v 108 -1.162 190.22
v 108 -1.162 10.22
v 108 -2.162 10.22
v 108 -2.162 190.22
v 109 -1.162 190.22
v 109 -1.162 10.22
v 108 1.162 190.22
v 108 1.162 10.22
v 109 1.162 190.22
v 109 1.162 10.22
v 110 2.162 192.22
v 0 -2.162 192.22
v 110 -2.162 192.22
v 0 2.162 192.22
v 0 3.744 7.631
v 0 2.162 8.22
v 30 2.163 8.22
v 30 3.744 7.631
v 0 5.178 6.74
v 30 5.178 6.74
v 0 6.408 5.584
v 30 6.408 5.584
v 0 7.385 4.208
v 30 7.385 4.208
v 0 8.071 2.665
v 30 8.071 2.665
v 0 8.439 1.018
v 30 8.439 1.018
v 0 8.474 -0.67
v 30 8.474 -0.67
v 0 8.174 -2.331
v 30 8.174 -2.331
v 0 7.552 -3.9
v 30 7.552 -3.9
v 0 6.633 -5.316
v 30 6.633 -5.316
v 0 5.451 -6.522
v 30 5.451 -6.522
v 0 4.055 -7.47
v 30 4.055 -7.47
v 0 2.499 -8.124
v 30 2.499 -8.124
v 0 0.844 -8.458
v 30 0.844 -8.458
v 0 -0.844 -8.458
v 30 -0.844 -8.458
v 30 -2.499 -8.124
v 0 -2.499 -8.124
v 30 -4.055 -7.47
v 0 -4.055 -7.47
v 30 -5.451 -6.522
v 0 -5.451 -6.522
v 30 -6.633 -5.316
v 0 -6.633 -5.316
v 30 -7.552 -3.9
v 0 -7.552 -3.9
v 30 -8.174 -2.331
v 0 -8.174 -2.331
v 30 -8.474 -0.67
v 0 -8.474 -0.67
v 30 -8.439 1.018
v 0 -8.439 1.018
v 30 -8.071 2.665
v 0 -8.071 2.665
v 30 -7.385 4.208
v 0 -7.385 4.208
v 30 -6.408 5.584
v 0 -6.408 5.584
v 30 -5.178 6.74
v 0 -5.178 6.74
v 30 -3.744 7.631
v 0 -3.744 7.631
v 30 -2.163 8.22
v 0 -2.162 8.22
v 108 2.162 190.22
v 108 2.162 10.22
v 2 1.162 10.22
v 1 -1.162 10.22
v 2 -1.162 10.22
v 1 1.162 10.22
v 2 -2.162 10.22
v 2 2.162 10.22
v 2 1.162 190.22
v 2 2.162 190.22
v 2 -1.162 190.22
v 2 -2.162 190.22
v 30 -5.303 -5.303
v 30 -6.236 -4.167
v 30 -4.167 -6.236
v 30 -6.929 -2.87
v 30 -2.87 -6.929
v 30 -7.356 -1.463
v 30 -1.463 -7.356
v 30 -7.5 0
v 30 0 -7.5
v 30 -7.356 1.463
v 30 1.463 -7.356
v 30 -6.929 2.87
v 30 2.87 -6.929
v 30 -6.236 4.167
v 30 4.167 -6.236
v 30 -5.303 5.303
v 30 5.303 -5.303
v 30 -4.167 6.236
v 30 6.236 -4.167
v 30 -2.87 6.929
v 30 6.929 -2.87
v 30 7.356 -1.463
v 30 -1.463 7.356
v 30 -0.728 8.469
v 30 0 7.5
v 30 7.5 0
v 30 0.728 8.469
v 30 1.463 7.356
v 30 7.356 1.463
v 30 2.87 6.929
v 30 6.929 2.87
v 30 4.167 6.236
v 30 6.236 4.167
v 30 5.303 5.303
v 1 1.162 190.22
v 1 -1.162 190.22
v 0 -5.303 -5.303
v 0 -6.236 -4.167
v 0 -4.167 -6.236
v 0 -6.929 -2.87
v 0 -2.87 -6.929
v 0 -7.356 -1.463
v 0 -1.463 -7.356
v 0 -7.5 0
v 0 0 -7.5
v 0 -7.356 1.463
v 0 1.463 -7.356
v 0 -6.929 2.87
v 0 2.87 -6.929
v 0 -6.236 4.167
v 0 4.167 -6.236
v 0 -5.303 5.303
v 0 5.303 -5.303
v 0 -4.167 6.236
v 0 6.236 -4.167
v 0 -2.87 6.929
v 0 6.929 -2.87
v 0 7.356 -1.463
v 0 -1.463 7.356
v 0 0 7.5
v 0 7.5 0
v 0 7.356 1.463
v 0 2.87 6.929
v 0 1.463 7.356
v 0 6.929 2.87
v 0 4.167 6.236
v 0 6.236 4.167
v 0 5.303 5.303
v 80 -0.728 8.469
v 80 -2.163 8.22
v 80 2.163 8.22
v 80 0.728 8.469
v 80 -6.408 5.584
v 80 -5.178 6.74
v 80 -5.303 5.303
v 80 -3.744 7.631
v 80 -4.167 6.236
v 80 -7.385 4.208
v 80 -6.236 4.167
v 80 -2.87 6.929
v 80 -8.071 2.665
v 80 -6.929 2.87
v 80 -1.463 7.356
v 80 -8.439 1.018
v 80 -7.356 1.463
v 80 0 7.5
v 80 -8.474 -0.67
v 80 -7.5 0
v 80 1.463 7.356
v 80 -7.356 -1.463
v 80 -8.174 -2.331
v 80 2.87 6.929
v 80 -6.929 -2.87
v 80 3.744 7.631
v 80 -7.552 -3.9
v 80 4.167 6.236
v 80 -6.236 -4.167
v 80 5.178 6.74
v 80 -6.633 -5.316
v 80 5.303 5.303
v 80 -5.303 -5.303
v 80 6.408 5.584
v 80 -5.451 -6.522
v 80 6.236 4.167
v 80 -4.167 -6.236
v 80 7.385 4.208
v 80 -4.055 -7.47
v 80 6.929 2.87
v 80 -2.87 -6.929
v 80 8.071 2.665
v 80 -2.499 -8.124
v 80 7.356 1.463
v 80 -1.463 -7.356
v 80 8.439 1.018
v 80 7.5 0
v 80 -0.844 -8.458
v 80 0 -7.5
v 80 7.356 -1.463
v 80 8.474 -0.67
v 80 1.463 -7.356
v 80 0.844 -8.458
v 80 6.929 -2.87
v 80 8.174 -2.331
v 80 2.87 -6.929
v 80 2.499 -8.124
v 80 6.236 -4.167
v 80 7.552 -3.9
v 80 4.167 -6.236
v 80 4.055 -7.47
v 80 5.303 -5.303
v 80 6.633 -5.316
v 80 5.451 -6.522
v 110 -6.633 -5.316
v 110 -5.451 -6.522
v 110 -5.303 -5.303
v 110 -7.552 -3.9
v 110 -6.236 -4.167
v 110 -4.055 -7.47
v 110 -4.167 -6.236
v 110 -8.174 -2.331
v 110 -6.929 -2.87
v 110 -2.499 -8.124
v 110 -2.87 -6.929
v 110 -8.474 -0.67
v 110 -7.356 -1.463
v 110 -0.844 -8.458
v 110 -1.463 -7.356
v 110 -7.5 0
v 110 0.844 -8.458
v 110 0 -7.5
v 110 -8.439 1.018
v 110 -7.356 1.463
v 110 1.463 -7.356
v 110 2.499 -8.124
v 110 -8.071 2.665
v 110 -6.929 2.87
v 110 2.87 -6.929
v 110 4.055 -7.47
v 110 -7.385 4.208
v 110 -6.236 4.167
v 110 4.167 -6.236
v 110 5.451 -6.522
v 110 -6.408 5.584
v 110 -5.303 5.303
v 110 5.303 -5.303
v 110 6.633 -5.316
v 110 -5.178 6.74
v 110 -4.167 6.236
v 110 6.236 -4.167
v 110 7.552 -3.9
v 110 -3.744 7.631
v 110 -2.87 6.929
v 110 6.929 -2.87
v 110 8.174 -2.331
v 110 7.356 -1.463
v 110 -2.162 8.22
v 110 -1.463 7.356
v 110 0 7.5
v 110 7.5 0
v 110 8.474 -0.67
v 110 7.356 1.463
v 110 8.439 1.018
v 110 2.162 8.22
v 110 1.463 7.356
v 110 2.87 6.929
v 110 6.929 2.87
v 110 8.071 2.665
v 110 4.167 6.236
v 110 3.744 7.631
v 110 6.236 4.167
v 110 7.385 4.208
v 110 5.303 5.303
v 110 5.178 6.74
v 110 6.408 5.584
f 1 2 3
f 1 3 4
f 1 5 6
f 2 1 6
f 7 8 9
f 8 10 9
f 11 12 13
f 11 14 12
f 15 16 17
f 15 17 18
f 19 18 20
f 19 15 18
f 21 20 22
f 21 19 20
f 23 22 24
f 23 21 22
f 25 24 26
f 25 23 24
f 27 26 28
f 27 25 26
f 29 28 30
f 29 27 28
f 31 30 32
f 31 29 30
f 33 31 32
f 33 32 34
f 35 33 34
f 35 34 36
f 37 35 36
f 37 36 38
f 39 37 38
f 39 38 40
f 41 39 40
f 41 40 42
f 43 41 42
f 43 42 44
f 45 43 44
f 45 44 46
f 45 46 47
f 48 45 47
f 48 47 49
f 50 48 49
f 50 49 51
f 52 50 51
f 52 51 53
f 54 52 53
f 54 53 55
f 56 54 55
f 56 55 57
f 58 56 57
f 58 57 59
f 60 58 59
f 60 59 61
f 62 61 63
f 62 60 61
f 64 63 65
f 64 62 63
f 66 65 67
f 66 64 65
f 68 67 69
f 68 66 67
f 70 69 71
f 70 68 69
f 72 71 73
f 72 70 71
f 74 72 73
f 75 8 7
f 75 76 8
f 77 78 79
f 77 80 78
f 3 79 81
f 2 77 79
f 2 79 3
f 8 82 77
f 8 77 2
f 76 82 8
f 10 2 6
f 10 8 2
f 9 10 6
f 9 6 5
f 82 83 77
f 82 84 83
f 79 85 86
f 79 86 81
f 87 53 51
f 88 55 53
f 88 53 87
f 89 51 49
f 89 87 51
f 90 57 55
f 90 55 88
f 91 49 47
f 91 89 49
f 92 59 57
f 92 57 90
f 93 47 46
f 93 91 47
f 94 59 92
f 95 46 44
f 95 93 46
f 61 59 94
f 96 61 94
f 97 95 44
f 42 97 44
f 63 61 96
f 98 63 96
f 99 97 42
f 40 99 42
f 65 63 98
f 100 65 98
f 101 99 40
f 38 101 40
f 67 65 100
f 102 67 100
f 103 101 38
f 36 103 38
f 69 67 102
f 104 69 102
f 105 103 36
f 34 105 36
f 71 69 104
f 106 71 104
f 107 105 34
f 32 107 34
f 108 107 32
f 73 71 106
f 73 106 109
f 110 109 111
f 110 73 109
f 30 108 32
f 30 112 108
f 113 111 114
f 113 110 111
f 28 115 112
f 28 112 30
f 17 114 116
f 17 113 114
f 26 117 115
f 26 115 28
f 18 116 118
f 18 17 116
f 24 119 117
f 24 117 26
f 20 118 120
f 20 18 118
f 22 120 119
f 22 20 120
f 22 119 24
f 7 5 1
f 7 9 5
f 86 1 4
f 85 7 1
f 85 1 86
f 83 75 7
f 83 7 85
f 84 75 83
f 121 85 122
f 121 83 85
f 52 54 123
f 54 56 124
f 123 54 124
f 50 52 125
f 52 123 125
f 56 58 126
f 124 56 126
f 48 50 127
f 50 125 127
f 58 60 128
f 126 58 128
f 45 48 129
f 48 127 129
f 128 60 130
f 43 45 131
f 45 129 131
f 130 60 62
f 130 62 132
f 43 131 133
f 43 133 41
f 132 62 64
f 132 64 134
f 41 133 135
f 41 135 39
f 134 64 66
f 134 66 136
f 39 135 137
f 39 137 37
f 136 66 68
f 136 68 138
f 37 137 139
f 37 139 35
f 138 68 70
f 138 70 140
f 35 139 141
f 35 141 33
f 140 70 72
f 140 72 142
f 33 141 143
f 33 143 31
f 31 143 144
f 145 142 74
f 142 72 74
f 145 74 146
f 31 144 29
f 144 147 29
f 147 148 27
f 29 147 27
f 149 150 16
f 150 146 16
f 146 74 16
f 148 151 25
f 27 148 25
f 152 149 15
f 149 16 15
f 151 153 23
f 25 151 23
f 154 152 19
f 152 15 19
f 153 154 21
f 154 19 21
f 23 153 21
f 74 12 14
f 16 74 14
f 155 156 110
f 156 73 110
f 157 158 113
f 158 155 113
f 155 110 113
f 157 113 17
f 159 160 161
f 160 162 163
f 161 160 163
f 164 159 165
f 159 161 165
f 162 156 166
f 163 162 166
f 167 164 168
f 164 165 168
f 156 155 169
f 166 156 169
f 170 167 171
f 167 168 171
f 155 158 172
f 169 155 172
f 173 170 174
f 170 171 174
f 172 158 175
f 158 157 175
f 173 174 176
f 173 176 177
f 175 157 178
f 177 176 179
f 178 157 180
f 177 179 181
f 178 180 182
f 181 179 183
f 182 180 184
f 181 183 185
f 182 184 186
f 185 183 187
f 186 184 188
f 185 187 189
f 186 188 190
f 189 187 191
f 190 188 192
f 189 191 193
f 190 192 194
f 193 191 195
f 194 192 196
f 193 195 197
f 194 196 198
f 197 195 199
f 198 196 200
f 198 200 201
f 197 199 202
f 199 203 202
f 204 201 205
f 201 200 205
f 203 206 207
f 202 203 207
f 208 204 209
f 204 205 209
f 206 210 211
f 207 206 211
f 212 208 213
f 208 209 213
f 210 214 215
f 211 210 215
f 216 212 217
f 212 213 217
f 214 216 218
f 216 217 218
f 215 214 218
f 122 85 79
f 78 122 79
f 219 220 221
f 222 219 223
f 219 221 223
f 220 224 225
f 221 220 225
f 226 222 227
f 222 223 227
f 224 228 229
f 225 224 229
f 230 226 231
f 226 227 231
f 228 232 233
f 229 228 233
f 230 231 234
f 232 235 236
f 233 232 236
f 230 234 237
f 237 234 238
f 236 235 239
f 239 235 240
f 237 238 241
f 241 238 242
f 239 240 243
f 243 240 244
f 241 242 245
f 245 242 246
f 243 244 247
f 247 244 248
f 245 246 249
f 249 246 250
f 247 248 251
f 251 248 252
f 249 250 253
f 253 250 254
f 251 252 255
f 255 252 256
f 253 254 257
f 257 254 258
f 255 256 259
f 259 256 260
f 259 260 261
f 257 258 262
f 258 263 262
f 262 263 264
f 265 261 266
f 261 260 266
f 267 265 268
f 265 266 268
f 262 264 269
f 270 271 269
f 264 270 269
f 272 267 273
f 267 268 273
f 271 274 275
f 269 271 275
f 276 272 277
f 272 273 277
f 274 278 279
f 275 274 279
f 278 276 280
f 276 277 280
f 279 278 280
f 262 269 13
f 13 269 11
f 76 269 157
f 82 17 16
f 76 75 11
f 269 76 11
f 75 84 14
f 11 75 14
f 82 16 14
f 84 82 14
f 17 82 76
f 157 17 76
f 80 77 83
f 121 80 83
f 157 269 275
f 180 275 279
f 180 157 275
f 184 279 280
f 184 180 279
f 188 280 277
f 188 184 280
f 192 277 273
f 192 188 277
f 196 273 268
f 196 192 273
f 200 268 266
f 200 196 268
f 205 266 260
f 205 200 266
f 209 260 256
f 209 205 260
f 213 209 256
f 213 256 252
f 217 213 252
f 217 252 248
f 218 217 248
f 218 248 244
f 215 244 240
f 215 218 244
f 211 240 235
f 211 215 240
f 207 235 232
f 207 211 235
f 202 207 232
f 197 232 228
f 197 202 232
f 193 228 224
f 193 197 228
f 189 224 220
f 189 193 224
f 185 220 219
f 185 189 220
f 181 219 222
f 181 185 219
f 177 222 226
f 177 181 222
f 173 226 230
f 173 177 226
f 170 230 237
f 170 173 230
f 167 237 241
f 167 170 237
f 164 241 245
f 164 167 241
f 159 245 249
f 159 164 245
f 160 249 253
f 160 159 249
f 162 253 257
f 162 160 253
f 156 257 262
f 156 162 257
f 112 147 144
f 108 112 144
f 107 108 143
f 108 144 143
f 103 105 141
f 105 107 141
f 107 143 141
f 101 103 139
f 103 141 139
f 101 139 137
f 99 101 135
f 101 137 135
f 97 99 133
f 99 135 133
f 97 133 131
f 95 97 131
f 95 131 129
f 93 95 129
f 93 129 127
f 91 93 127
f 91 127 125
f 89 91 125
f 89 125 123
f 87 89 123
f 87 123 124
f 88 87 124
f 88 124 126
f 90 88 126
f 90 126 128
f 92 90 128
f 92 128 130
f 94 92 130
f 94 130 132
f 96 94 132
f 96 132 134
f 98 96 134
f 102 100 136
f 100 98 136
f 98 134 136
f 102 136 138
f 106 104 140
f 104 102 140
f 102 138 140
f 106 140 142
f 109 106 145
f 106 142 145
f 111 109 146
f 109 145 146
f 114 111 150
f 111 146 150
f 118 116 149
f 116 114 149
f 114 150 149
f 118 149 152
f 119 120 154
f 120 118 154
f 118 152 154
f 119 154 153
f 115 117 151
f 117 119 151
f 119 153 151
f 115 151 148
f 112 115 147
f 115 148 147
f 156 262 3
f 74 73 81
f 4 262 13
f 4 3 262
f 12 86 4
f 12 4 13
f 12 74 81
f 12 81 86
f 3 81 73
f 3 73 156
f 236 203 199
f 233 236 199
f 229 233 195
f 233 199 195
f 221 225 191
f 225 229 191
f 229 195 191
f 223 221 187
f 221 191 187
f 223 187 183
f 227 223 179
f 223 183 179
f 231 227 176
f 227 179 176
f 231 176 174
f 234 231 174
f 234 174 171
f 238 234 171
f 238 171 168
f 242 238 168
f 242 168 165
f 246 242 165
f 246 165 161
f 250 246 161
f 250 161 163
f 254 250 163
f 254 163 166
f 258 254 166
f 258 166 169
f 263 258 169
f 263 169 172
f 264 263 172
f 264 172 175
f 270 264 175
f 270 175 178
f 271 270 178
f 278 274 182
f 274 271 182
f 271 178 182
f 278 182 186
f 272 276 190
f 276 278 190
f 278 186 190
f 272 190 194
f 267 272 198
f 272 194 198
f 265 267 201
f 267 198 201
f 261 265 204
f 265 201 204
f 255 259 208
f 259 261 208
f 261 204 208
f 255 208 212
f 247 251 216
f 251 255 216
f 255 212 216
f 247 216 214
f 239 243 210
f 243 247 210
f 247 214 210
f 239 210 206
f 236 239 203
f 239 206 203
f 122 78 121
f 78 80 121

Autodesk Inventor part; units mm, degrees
ref_plane "YZ Plane" through (0, 0, 0) normal (1, 0, 0) x (0, 1, 0)
ref_plane "XZ Plane" through (0, 0, 0) normal (0, 1, 0) x (-1, 0, 0)
sketch "Эскиз1" plane through (0, 0, 0) normal (1, 0, 0) x (0, 1, 0)
  circle A0 centre (0, 0) radius 7.5
  circle A1 centre (0, 0) radius 8.5
  dimension "d0" = 15
  dimension "d1" = 17
extrude "Выдавливание1" add sketch "Эскиз1" along normal blind 30
ref_plane "РабПлоскость1" through (80, 0, 0) normal (1, 0, 0) x (0, 0, -1)
sketch "Эскиз2" plane through (80, 0, 0) normal (1, 0, 0) x (0, 0, -1)
  circle A0 centre (0, 0) radius 8.5
  circle A1 centre (0, 0) radius 7.5
  dimension "d5" = 17
  dimension "d6" = 15
extrude "Выдавливание2" add sketch "Эскиз2" along normal blind 30
sketch "Эскиз3" plane through (0, 0, 0) normal (-1, 0, 0) x (0, 0, 1)
  circle A0 centre (0, 0) radius 7.5 projected
  line L0 (-7.5, 0) -> (7.5, 0)
  circle A1 centre (0, 0) radius 8.5 projected
  circle A2 centre (0, 0) radius 7.5 projected
  circle A3 centre (0, 0) radius 8.5 projected
  line L1 (8.2203, -2.1625) -> (12.2203, -2.1625)
  line L2 (8.2203, 2.1625) -> (12.2203, 2.1625)
  line L3 (12.2203, -2.1625) -> (12.2203, 2.1625)
  arc A4 (8.2203, -2.1625) -> (8.2203, 2.1625) centre (0, 0) ccw
  dimension "d9" = 4
extrude "Выдавливание3" add sketch "Эскиз3" against normal blind 110 contours A1 L2 L3 L1
sketch "Эскиз4" plane through (0, -2.1625, 12.2203) normal (0, 0, 1) x (1, 0, 0)
  line L0 (0, 4.325) -> (30, 4.325) projected
  line L1 (0, 0) -> (110, 0) projected
  line L2 (0, 4.325) -> (110, 4.325)
  line L3 (110, 4.325) -> (110, 0)
  line L4 (110, 0) -> (0, 0)
  line L5 (0, 0) -> (0, 4.325)
  line L6 (109, 1) -> (1, 1)
  line L7 (1, 1) -> (1, 3.325)
  line L8 (1, 3.325) -> (109, 3.325)
  line L9 (109, 3.325) -> (109, 1)
  line L10 (109, 1) -> (1, 3.325) construction
  line L11 (1, 1) -> (109, 3.325) construction
  line L12 (0, 4.325) -> (110, 4.325) projected
  line L13 (110, 0) -> (0, 0)
  line L14 (0, 0) -> (0, 4.325)
  line L15 (0, 4.325) -> (110, 4.325)
  line L16 (110, 4.325) -> (110, 0)
  line L17 (110, 0) -> (0, 4.325) construction
  line L18 (0, 0) -> (110, 4.325) construction
  point P0 (0, 2.1625)
  point P1 (55, 2.1625)
  point P2 (55, 2.1625)
  dimension "d12" = 108
  dimension "d13" = 2.325
extrude "Выдавливание4" add sketch "Эскиз4" along normal blind 180 contours L0 L2 L3 L1 L5 | L6 L7 L8 L9
sketch "Эскиз5" plane through (30, 2.1625, 8.2203) normal (0, 1, 0) x (1, 0, 0)
  line L0 (80, -184) -> (-30, -184) projected
  line L1 (25, -184) -> (25, -92)
  line L2 (-28, -2) -> (78, -2)
  line L3 (78, -2) -> (78, -182)
  line L4 (78, -182) -> (-28, -182)
  line L5 (-28, -182) -> (-28, -2)
  line L6 (-28, -2) -> (78, -182) construction
  line L7 (78, -2) -> (-28, -182) construction
  point P0 (-30, 8.2203)
  dimension "d16" = 92
  dimension "d17" = 106
  dimension "d18" = 180
extrude "Выдавливание5" cut sketch "Эскиз5" against normal blind 180
sketch "Эскиз6" plane through (108, 2.1625, 10.2203) normal (-1, 0, 0) x (0, 0, 1)
  line L0 (0, 0) -> (180, 0) projected
  line L1 (0, 0) -> (0, -1)
  line L2 (0, 0) -> (0, -4.325) projected
  line L3 (0, -1) -> (180, -1)
  line L4 (180, -1) -> (180, -3.325)
  line L5 (180, -3.325) -> (0, -3.325)
  line L6 (0, -3.325) -> (0, -1)
  point P0 (-10.2203, -2.1625)
  point P1 (0, -3.325)
  dimension "d21" = 1
  dimension "d22" = 2.325
extrude "Выдавливание6" cut sketch "Эскиз6" along normal blind 107 and the other way blind 1
properties part number "вращалка"
